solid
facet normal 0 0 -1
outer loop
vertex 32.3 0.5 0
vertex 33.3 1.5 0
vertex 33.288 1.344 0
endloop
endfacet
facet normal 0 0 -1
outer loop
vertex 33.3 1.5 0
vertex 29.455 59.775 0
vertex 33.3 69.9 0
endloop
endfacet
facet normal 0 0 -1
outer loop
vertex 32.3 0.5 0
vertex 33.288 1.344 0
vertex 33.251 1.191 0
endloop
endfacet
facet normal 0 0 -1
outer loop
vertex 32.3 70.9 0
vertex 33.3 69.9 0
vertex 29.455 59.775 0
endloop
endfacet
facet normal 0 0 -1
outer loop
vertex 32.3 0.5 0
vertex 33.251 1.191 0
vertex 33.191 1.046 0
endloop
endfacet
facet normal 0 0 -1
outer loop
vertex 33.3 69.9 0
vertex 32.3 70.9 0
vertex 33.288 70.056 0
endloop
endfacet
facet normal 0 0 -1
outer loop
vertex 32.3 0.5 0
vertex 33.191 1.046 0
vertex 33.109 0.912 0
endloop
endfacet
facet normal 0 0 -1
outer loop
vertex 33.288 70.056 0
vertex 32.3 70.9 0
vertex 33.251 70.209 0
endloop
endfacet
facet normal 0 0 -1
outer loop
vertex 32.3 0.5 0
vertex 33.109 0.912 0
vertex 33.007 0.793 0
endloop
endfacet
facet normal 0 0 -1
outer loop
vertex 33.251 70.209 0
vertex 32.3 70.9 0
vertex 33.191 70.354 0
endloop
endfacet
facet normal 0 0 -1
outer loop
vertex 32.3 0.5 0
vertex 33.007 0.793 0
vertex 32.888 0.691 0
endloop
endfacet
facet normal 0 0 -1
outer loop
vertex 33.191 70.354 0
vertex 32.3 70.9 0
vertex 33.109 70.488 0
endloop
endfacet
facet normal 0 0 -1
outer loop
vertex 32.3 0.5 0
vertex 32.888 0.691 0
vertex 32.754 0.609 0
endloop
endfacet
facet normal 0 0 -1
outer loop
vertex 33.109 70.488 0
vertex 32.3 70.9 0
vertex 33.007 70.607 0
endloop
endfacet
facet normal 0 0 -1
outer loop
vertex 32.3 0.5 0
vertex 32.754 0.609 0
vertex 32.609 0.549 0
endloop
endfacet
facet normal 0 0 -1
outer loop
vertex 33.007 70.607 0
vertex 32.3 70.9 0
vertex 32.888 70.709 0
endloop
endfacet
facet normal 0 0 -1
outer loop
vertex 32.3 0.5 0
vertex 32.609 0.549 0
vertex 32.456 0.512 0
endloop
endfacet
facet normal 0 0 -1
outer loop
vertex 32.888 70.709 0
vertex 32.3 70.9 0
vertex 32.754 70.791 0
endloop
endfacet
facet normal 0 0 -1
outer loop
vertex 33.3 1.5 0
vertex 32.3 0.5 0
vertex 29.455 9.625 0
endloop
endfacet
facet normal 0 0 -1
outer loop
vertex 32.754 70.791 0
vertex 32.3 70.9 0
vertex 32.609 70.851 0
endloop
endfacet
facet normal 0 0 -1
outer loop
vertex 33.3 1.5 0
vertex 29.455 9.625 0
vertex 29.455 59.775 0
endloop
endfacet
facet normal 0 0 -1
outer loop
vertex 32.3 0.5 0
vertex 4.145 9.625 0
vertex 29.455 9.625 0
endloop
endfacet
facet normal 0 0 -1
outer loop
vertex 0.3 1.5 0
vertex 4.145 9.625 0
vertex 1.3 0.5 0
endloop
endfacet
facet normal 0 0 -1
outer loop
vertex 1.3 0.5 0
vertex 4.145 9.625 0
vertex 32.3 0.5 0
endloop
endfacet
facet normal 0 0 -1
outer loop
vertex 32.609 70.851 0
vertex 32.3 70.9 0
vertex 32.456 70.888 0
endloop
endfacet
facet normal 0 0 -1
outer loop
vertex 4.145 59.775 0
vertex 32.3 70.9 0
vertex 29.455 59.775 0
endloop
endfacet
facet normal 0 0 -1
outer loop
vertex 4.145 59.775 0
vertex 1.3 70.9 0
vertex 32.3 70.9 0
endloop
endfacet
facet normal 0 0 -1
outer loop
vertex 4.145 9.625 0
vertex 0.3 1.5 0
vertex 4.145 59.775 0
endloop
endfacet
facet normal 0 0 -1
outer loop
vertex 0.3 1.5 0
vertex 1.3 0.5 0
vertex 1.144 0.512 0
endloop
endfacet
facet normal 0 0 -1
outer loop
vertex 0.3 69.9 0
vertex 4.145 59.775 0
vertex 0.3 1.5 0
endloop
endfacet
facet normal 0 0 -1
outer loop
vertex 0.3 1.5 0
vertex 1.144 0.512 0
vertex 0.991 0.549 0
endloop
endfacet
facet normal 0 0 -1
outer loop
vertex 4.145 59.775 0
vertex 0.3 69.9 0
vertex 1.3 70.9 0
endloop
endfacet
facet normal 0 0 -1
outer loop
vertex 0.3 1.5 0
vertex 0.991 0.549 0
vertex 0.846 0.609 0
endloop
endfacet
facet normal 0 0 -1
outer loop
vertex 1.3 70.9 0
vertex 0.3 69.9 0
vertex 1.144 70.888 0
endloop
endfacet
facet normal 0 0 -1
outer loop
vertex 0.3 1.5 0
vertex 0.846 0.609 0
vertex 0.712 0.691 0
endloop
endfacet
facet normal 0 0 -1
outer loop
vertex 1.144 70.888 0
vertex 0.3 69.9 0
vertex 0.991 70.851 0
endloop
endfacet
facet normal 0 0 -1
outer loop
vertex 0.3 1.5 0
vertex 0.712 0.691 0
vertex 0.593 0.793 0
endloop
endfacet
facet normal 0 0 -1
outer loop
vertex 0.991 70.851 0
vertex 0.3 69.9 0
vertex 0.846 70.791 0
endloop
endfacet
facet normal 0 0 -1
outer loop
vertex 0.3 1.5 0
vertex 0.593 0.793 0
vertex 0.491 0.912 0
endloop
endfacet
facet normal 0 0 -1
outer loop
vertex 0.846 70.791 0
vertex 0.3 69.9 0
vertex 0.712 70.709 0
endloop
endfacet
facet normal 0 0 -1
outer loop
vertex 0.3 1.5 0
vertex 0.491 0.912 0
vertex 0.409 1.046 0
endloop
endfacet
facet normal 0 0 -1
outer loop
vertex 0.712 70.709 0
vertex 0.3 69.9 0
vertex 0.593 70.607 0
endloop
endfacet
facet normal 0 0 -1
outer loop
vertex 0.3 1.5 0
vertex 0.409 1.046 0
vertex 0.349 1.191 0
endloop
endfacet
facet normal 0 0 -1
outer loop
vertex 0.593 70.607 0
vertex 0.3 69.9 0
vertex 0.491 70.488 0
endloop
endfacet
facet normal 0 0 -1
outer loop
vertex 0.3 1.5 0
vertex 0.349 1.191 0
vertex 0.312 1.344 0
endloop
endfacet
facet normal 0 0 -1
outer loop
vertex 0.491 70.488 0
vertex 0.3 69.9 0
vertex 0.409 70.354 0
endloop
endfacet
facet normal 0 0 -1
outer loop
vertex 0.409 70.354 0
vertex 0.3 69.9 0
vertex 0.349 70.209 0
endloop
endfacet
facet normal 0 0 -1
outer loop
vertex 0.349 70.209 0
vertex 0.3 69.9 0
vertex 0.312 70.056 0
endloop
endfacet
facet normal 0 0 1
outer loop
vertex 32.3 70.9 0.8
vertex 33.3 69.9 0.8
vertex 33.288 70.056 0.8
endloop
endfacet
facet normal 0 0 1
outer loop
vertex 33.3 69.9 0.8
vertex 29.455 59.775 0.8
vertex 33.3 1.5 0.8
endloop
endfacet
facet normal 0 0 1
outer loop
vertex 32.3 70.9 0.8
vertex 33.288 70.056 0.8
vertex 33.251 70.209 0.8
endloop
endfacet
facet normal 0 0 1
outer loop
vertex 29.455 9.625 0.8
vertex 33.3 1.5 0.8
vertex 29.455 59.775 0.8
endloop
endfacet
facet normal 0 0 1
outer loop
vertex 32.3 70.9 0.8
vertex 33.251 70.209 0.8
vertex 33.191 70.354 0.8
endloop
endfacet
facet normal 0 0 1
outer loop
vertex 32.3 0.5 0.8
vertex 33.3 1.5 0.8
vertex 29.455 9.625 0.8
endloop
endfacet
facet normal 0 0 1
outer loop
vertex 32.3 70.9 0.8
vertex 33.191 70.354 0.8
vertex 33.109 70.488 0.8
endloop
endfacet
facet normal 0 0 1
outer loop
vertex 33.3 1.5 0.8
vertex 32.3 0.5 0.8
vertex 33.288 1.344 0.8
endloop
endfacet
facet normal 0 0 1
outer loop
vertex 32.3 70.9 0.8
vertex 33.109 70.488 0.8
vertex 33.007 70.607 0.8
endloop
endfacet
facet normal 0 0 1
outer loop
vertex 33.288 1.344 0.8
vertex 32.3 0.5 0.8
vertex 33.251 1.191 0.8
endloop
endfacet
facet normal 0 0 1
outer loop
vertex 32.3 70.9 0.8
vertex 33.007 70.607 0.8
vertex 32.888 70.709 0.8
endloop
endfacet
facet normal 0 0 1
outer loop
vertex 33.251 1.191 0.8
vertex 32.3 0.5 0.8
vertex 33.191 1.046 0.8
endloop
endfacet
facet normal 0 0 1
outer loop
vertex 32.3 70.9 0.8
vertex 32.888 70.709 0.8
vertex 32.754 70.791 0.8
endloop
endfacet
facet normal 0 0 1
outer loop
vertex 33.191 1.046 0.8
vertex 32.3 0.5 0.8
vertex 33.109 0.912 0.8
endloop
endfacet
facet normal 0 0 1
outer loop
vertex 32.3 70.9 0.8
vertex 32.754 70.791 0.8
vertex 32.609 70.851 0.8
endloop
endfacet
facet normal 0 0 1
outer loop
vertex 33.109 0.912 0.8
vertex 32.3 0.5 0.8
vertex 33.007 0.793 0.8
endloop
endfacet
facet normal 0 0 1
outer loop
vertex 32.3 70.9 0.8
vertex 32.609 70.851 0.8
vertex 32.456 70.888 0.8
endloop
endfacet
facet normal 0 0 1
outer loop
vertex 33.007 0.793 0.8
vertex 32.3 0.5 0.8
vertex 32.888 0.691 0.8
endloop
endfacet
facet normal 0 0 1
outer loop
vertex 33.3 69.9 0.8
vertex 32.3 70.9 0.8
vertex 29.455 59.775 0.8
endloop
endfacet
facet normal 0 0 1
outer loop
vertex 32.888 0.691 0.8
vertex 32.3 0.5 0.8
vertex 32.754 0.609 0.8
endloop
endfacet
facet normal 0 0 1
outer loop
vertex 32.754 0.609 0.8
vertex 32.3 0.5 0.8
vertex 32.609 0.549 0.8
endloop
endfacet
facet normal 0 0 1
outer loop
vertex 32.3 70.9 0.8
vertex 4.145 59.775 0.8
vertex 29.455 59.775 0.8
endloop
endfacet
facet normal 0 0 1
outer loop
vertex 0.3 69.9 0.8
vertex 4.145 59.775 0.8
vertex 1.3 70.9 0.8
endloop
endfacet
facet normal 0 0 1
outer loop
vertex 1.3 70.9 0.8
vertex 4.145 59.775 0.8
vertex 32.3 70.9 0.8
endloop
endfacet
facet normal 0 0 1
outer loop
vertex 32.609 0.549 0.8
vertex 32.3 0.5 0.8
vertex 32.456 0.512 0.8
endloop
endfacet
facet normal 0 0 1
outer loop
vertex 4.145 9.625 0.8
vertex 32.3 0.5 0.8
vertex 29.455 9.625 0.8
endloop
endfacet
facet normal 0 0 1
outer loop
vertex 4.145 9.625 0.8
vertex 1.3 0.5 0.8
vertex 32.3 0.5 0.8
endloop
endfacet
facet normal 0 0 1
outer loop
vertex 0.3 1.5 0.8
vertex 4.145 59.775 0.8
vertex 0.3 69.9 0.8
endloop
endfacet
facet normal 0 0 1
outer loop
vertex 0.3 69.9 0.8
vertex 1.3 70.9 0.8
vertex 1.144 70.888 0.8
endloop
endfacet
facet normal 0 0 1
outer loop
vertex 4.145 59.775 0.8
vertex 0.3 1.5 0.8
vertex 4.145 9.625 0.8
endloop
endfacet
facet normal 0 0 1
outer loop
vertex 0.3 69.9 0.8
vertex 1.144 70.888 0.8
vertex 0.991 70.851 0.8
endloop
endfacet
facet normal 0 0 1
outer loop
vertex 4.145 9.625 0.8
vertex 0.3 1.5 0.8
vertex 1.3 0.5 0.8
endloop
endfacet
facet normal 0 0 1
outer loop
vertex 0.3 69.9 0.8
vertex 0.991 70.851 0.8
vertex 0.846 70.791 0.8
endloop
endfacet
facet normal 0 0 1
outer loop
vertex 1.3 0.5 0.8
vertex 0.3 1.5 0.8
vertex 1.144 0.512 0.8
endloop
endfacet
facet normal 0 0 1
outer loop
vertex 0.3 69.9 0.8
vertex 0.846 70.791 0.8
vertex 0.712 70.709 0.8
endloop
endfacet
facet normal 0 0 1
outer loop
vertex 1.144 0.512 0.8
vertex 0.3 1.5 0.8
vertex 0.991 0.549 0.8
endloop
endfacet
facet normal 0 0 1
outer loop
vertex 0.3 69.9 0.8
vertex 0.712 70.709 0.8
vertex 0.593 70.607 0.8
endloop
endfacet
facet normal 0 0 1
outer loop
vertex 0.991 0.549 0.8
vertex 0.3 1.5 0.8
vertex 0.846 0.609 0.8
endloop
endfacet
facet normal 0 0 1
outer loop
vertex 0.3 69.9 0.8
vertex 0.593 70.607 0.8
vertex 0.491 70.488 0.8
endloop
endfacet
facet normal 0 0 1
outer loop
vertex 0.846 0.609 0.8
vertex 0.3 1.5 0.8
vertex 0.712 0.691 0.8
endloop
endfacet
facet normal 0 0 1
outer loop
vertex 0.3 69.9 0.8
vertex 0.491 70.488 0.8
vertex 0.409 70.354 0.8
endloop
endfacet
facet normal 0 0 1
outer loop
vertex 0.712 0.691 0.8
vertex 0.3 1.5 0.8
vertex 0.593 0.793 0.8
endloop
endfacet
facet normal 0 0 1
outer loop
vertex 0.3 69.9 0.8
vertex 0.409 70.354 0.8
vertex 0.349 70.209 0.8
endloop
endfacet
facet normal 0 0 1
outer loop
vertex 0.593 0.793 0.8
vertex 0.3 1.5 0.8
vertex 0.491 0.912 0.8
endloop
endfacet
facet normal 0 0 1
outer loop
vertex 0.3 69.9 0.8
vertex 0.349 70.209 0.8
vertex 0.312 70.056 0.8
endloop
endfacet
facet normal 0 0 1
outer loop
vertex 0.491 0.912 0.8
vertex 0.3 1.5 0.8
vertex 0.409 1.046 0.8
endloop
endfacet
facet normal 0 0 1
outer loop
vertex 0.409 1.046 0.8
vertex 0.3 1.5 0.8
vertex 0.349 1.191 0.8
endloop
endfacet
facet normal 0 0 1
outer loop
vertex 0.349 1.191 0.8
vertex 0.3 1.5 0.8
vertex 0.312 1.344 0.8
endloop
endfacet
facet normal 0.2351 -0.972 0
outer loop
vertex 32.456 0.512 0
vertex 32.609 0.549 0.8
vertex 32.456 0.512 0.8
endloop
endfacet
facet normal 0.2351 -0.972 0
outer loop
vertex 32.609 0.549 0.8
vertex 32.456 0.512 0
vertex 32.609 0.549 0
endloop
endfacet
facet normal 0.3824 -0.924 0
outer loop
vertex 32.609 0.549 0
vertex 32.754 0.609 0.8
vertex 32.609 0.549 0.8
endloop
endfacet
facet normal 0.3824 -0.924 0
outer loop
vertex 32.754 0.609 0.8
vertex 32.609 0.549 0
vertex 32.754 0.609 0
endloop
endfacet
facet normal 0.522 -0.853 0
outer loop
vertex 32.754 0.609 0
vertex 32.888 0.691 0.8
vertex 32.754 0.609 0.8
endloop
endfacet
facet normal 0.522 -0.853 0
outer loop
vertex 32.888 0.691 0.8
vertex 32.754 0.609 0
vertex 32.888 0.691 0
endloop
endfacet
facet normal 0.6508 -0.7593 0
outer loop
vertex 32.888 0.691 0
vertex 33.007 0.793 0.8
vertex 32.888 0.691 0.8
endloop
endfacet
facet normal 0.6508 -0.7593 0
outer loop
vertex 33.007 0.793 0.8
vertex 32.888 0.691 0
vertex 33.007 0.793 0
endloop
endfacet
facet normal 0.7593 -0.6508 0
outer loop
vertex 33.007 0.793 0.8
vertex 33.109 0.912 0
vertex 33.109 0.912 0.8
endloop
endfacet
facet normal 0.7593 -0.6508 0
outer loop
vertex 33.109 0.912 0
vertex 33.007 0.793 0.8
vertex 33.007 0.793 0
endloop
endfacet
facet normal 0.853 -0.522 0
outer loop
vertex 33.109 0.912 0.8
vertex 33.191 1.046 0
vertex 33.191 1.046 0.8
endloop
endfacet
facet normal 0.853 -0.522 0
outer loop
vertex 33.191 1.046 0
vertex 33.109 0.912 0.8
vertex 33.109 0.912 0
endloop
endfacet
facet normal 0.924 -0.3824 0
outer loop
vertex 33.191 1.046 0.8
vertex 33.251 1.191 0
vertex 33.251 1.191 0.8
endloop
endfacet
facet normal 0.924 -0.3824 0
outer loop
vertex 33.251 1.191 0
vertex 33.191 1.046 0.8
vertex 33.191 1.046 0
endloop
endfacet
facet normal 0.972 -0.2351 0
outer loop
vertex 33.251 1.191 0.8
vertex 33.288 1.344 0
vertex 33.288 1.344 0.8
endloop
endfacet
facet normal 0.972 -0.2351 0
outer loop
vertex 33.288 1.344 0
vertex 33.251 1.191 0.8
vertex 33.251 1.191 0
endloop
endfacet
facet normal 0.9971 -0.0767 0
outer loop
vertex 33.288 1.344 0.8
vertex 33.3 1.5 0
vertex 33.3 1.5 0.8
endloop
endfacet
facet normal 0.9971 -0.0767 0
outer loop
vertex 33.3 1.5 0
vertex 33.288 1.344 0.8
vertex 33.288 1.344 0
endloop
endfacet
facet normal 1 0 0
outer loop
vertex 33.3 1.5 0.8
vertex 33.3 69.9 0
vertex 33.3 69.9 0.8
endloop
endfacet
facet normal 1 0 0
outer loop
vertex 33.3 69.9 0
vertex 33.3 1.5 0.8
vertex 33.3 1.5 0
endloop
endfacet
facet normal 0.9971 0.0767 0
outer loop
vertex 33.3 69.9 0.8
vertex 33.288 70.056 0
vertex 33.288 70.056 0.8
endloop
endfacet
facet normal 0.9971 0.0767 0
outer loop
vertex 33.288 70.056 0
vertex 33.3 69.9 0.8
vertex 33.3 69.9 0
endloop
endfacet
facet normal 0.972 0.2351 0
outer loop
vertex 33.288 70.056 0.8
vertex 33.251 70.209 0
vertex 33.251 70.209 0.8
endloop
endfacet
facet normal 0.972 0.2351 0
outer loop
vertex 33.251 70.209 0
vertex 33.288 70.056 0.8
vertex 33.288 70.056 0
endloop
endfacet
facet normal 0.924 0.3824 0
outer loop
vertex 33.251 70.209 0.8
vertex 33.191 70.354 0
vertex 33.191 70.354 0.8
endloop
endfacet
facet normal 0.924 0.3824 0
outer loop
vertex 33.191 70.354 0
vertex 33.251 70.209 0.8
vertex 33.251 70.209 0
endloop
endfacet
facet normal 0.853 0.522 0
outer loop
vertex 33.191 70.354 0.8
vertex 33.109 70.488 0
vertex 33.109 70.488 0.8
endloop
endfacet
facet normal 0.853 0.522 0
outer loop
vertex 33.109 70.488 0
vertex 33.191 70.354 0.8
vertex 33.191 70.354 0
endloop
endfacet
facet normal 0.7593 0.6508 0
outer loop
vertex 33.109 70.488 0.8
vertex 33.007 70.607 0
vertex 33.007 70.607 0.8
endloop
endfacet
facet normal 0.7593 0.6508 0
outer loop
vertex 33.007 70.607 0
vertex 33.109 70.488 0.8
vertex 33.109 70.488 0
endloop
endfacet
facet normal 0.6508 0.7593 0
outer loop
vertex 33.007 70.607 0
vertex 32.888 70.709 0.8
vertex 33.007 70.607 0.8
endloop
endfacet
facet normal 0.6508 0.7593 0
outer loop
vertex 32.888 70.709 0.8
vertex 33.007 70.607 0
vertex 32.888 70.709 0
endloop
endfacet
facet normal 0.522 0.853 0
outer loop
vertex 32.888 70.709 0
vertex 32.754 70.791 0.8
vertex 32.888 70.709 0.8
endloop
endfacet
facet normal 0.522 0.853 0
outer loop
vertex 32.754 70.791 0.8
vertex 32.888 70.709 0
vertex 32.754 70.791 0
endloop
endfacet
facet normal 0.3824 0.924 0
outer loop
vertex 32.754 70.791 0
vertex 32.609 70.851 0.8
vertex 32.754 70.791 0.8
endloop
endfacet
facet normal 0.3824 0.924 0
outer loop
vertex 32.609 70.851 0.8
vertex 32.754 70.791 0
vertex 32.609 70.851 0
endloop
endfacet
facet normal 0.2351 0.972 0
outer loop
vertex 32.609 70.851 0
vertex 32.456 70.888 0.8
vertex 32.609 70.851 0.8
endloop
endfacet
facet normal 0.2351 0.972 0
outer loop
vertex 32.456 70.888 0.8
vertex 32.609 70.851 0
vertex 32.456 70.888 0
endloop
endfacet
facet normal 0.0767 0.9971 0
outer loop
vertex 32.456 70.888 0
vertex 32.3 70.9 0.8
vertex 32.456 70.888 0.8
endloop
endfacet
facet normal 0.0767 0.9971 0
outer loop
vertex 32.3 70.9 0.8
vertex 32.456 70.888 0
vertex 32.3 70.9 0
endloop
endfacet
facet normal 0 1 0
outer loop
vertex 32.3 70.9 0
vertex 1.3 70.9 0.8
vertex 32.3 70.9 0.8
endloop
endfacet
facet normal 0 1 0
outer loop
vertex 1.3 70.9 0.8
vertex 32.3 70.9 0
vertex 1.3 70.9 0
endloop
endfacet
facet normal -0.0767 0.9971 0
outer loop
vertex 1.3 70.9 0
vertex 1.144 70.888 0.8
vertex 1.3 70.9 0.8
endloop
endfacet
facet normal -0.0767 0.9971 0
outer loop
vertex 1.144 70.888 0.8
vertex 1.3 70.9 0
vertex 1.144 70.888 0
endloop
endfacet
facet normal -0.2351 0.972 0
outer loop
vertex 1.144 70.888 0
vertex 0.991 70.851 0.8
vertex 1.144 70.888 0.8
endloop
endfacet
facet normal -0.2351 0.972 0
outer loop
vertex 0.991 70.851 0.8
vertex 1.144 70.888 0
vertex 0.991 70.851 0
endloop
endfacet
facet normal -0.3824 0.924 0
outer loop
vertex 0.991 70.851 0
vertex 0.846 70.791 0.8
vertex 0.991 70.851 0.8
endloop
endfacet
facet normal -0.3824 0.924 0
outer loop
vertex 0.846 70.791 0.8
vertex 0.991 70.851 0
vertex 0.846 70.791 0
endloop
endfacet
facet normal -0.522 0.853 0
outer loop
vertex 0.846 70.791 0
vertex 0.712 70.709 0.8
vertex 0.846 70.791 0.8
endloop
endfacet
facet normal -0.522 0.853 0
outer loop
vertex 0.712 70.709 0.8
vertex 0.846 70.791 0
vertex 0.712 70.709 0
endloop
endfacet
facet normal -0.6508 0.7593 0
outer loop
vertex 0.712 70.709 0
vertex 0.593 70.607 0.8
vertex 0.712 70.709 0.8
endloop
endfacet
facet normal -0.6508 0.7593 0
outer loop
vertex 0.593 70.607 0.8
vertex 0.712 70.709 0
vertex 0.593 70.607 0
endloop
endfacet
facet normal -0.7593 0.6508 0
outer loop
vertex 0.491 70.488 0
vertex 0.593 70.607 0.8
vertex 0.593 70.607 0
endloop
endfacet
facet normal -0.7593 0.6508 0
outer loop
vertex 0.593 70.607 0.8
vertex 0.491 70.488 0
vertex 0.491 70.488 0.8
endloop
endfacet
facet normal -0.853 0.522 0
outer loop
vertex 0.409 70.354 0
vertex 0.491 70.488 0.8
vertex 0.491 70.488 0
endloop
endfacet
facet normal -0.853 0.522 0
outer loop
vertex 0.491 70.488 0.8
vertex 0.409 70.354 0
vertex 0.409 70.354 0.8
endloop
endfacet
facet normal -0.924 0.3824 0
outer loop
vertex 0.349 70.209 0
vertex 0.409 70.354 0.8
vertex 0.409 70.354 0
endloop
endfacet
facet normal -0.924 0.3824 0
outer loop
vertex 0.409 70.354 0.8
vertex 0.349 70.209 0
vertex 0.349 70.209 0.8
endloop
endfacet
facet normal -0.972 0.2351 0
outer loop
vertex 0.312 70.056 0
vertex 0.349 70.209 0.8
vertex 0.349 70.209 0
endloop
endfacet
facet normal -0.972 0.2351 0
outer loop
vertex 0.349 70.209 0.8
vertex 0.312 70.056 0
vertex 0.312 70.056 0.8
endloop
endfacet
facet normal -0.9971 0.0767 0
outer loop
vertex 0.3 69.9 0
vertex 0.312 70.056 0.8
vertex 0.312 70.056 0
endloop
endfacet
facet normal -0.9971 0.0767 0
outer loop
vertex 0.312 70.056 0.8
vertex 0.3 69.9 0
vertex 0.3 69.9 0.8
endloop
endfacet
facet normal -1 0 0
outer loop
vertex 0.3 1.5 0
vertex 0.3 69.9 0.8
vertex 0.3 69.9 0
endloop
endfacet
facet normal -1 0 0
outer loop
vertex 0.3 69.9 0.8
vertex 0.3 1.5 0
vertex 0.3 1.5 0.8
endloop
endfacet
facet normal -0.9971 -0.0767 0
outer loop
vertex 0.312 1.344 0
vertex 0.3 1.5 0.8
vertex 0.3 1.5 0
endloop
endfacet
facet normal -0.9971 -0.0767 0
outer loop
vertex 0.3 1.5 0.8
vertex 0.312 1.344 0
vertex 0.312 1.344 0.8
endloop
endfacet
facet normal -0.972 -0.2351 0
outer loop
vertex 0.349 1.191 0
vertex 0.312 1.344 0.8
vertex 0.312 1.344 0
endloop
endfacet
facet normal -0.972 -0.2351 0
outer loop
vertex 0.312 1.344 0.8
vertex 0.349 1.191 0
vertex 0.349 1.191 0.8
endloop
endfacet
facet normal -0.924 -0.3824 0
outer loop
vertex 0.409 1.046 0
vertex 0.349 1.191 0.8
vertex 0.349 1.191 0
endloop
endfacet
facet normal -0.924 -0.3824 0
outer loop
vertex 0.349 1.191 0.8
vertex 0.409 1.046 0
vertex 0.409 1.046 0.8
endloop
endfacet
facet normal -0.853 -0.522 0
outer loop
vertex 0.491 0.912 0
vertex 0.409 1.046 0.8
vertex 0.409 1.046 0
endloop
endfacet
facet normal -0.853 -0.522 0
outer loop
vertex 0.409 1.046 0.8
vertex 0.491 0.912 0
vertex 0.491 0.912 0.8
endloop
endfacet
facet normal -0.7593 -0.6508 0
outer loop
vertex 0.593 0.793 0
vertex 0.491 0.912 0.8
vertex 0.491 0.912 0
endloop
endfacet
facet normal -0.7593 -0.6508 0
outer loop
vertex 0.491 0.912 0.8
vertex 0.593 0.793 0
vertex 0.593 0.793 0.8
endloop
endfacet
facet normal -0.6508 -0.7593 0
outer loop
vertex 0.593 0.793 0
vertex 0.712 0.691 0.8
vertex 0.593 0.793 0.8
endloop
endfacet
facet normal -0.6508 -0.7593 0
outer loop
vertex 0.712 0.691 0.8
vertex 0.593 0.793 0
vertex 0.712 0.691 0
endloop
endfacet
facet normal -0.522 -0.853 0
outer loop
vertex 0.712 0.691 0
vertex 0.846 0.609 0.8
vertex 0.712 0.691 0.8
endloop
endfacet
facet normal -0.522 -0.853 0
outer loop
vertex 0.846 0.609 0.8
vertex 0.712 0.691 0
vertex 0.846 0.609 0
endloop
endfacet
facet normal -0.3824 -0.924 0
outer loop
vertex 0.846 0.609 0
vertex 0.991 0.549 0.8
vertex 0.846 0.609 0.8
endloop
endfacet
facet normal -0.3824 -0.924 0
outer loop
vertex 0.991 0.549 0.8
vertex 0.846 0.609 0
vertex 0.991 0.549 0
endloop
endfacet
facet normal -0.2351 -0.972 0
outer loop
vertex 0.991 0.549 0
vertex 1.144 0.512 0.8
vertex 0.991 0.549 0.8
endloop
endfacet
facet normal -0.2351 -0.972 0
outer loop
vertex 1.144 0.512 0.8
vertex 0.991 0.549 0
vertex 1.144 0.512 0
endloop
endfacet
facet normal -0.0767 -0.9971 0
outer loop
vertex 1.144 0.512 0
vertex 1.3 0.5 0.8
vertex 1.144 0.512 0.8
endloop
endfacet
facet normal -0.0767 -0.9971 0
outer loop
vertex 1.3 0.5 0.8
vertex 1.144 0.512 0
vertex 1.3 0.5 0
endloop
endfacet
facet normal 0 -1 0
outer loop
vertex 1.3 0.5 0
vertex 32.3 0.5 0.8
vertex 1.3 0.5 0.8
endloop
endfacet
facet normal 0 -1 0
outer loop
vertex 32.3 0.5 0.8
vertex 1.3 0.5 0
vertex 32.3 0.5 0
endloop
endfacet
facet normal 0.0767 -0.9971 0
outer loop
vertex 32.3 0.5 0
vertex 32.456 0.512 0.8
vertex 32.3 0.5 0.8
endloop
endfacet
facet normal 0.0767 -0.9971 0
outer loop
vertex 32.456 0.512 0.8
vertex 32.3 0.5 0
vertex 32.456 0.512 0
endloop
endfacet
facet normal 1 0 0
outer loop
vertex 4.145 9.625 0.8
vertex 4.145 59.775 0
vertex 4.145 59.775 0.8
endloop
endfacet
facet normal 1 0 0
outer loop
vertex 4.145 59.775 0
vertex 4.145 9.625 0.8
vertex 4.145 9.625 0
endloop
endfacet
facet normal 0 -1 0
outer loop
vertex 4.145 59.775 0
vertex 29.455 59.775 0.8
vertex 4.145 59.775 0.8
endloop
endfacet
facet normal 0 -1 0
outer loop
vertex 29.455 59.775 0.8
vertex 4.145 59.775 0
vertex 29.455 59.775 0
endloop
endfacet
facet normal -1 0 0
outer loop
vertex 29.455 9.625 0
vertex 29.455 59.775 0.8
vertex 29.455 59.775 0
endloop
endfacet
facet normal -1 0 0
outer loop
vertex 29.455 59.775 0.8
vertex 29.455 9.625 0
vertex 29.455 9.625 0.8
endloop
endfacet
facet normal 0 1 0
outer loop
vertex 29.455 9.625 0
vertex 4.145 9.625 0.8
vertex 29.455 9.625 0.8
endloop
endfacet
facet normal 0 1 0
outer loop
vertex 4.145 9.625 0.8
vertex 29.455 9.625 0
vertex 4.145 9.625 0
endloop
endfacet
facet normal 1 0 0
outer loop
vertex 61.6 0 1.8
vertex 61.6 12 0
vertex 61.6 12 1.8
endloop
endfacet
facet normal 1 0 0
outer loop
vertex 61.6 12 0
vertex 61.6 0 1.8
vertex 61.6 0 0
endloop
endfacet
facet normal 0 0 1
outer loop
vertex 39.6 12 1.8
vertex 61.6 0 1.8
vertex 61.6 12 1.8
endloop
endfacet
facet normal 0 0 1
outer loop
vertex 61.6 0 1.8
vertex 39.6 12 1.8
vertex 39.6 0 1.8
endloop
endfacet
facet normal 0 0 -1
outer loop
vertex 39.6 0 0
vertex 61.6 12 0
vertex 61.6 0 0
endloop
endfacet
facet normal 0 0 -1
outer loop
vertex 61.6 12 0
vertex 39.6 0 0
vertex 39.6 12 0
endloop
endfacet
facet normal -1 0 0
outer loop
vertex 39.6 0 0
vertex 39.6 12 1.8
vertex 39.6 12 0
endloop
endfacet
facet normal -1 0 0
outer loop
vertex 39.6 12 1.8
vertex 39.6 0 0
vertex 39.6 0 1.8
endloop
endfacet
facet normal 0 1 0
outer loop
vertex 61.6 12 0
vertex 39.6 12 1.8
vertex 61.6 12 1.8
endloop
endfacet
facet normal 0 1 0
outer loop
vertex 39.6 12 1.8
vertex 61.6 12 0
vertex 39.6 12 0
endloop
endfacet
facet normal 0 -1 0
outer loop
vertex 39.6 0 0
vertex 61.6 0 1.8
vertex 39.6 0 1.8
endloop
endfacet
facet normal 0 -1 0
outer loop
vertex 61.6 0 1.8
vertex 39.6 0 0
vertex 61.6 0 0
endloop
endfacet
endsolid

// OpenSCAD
include <../lib/kobo-meshcore-case-lib.scad>;
$fn = 40;
color("#333333") translate([-bezel_x0, -display_y + 2, 0]) bezel_gasket();
color("#666666") translate([bezel_x1 - bezel_x0 + 6, 0, 0]) kobo_pad();
